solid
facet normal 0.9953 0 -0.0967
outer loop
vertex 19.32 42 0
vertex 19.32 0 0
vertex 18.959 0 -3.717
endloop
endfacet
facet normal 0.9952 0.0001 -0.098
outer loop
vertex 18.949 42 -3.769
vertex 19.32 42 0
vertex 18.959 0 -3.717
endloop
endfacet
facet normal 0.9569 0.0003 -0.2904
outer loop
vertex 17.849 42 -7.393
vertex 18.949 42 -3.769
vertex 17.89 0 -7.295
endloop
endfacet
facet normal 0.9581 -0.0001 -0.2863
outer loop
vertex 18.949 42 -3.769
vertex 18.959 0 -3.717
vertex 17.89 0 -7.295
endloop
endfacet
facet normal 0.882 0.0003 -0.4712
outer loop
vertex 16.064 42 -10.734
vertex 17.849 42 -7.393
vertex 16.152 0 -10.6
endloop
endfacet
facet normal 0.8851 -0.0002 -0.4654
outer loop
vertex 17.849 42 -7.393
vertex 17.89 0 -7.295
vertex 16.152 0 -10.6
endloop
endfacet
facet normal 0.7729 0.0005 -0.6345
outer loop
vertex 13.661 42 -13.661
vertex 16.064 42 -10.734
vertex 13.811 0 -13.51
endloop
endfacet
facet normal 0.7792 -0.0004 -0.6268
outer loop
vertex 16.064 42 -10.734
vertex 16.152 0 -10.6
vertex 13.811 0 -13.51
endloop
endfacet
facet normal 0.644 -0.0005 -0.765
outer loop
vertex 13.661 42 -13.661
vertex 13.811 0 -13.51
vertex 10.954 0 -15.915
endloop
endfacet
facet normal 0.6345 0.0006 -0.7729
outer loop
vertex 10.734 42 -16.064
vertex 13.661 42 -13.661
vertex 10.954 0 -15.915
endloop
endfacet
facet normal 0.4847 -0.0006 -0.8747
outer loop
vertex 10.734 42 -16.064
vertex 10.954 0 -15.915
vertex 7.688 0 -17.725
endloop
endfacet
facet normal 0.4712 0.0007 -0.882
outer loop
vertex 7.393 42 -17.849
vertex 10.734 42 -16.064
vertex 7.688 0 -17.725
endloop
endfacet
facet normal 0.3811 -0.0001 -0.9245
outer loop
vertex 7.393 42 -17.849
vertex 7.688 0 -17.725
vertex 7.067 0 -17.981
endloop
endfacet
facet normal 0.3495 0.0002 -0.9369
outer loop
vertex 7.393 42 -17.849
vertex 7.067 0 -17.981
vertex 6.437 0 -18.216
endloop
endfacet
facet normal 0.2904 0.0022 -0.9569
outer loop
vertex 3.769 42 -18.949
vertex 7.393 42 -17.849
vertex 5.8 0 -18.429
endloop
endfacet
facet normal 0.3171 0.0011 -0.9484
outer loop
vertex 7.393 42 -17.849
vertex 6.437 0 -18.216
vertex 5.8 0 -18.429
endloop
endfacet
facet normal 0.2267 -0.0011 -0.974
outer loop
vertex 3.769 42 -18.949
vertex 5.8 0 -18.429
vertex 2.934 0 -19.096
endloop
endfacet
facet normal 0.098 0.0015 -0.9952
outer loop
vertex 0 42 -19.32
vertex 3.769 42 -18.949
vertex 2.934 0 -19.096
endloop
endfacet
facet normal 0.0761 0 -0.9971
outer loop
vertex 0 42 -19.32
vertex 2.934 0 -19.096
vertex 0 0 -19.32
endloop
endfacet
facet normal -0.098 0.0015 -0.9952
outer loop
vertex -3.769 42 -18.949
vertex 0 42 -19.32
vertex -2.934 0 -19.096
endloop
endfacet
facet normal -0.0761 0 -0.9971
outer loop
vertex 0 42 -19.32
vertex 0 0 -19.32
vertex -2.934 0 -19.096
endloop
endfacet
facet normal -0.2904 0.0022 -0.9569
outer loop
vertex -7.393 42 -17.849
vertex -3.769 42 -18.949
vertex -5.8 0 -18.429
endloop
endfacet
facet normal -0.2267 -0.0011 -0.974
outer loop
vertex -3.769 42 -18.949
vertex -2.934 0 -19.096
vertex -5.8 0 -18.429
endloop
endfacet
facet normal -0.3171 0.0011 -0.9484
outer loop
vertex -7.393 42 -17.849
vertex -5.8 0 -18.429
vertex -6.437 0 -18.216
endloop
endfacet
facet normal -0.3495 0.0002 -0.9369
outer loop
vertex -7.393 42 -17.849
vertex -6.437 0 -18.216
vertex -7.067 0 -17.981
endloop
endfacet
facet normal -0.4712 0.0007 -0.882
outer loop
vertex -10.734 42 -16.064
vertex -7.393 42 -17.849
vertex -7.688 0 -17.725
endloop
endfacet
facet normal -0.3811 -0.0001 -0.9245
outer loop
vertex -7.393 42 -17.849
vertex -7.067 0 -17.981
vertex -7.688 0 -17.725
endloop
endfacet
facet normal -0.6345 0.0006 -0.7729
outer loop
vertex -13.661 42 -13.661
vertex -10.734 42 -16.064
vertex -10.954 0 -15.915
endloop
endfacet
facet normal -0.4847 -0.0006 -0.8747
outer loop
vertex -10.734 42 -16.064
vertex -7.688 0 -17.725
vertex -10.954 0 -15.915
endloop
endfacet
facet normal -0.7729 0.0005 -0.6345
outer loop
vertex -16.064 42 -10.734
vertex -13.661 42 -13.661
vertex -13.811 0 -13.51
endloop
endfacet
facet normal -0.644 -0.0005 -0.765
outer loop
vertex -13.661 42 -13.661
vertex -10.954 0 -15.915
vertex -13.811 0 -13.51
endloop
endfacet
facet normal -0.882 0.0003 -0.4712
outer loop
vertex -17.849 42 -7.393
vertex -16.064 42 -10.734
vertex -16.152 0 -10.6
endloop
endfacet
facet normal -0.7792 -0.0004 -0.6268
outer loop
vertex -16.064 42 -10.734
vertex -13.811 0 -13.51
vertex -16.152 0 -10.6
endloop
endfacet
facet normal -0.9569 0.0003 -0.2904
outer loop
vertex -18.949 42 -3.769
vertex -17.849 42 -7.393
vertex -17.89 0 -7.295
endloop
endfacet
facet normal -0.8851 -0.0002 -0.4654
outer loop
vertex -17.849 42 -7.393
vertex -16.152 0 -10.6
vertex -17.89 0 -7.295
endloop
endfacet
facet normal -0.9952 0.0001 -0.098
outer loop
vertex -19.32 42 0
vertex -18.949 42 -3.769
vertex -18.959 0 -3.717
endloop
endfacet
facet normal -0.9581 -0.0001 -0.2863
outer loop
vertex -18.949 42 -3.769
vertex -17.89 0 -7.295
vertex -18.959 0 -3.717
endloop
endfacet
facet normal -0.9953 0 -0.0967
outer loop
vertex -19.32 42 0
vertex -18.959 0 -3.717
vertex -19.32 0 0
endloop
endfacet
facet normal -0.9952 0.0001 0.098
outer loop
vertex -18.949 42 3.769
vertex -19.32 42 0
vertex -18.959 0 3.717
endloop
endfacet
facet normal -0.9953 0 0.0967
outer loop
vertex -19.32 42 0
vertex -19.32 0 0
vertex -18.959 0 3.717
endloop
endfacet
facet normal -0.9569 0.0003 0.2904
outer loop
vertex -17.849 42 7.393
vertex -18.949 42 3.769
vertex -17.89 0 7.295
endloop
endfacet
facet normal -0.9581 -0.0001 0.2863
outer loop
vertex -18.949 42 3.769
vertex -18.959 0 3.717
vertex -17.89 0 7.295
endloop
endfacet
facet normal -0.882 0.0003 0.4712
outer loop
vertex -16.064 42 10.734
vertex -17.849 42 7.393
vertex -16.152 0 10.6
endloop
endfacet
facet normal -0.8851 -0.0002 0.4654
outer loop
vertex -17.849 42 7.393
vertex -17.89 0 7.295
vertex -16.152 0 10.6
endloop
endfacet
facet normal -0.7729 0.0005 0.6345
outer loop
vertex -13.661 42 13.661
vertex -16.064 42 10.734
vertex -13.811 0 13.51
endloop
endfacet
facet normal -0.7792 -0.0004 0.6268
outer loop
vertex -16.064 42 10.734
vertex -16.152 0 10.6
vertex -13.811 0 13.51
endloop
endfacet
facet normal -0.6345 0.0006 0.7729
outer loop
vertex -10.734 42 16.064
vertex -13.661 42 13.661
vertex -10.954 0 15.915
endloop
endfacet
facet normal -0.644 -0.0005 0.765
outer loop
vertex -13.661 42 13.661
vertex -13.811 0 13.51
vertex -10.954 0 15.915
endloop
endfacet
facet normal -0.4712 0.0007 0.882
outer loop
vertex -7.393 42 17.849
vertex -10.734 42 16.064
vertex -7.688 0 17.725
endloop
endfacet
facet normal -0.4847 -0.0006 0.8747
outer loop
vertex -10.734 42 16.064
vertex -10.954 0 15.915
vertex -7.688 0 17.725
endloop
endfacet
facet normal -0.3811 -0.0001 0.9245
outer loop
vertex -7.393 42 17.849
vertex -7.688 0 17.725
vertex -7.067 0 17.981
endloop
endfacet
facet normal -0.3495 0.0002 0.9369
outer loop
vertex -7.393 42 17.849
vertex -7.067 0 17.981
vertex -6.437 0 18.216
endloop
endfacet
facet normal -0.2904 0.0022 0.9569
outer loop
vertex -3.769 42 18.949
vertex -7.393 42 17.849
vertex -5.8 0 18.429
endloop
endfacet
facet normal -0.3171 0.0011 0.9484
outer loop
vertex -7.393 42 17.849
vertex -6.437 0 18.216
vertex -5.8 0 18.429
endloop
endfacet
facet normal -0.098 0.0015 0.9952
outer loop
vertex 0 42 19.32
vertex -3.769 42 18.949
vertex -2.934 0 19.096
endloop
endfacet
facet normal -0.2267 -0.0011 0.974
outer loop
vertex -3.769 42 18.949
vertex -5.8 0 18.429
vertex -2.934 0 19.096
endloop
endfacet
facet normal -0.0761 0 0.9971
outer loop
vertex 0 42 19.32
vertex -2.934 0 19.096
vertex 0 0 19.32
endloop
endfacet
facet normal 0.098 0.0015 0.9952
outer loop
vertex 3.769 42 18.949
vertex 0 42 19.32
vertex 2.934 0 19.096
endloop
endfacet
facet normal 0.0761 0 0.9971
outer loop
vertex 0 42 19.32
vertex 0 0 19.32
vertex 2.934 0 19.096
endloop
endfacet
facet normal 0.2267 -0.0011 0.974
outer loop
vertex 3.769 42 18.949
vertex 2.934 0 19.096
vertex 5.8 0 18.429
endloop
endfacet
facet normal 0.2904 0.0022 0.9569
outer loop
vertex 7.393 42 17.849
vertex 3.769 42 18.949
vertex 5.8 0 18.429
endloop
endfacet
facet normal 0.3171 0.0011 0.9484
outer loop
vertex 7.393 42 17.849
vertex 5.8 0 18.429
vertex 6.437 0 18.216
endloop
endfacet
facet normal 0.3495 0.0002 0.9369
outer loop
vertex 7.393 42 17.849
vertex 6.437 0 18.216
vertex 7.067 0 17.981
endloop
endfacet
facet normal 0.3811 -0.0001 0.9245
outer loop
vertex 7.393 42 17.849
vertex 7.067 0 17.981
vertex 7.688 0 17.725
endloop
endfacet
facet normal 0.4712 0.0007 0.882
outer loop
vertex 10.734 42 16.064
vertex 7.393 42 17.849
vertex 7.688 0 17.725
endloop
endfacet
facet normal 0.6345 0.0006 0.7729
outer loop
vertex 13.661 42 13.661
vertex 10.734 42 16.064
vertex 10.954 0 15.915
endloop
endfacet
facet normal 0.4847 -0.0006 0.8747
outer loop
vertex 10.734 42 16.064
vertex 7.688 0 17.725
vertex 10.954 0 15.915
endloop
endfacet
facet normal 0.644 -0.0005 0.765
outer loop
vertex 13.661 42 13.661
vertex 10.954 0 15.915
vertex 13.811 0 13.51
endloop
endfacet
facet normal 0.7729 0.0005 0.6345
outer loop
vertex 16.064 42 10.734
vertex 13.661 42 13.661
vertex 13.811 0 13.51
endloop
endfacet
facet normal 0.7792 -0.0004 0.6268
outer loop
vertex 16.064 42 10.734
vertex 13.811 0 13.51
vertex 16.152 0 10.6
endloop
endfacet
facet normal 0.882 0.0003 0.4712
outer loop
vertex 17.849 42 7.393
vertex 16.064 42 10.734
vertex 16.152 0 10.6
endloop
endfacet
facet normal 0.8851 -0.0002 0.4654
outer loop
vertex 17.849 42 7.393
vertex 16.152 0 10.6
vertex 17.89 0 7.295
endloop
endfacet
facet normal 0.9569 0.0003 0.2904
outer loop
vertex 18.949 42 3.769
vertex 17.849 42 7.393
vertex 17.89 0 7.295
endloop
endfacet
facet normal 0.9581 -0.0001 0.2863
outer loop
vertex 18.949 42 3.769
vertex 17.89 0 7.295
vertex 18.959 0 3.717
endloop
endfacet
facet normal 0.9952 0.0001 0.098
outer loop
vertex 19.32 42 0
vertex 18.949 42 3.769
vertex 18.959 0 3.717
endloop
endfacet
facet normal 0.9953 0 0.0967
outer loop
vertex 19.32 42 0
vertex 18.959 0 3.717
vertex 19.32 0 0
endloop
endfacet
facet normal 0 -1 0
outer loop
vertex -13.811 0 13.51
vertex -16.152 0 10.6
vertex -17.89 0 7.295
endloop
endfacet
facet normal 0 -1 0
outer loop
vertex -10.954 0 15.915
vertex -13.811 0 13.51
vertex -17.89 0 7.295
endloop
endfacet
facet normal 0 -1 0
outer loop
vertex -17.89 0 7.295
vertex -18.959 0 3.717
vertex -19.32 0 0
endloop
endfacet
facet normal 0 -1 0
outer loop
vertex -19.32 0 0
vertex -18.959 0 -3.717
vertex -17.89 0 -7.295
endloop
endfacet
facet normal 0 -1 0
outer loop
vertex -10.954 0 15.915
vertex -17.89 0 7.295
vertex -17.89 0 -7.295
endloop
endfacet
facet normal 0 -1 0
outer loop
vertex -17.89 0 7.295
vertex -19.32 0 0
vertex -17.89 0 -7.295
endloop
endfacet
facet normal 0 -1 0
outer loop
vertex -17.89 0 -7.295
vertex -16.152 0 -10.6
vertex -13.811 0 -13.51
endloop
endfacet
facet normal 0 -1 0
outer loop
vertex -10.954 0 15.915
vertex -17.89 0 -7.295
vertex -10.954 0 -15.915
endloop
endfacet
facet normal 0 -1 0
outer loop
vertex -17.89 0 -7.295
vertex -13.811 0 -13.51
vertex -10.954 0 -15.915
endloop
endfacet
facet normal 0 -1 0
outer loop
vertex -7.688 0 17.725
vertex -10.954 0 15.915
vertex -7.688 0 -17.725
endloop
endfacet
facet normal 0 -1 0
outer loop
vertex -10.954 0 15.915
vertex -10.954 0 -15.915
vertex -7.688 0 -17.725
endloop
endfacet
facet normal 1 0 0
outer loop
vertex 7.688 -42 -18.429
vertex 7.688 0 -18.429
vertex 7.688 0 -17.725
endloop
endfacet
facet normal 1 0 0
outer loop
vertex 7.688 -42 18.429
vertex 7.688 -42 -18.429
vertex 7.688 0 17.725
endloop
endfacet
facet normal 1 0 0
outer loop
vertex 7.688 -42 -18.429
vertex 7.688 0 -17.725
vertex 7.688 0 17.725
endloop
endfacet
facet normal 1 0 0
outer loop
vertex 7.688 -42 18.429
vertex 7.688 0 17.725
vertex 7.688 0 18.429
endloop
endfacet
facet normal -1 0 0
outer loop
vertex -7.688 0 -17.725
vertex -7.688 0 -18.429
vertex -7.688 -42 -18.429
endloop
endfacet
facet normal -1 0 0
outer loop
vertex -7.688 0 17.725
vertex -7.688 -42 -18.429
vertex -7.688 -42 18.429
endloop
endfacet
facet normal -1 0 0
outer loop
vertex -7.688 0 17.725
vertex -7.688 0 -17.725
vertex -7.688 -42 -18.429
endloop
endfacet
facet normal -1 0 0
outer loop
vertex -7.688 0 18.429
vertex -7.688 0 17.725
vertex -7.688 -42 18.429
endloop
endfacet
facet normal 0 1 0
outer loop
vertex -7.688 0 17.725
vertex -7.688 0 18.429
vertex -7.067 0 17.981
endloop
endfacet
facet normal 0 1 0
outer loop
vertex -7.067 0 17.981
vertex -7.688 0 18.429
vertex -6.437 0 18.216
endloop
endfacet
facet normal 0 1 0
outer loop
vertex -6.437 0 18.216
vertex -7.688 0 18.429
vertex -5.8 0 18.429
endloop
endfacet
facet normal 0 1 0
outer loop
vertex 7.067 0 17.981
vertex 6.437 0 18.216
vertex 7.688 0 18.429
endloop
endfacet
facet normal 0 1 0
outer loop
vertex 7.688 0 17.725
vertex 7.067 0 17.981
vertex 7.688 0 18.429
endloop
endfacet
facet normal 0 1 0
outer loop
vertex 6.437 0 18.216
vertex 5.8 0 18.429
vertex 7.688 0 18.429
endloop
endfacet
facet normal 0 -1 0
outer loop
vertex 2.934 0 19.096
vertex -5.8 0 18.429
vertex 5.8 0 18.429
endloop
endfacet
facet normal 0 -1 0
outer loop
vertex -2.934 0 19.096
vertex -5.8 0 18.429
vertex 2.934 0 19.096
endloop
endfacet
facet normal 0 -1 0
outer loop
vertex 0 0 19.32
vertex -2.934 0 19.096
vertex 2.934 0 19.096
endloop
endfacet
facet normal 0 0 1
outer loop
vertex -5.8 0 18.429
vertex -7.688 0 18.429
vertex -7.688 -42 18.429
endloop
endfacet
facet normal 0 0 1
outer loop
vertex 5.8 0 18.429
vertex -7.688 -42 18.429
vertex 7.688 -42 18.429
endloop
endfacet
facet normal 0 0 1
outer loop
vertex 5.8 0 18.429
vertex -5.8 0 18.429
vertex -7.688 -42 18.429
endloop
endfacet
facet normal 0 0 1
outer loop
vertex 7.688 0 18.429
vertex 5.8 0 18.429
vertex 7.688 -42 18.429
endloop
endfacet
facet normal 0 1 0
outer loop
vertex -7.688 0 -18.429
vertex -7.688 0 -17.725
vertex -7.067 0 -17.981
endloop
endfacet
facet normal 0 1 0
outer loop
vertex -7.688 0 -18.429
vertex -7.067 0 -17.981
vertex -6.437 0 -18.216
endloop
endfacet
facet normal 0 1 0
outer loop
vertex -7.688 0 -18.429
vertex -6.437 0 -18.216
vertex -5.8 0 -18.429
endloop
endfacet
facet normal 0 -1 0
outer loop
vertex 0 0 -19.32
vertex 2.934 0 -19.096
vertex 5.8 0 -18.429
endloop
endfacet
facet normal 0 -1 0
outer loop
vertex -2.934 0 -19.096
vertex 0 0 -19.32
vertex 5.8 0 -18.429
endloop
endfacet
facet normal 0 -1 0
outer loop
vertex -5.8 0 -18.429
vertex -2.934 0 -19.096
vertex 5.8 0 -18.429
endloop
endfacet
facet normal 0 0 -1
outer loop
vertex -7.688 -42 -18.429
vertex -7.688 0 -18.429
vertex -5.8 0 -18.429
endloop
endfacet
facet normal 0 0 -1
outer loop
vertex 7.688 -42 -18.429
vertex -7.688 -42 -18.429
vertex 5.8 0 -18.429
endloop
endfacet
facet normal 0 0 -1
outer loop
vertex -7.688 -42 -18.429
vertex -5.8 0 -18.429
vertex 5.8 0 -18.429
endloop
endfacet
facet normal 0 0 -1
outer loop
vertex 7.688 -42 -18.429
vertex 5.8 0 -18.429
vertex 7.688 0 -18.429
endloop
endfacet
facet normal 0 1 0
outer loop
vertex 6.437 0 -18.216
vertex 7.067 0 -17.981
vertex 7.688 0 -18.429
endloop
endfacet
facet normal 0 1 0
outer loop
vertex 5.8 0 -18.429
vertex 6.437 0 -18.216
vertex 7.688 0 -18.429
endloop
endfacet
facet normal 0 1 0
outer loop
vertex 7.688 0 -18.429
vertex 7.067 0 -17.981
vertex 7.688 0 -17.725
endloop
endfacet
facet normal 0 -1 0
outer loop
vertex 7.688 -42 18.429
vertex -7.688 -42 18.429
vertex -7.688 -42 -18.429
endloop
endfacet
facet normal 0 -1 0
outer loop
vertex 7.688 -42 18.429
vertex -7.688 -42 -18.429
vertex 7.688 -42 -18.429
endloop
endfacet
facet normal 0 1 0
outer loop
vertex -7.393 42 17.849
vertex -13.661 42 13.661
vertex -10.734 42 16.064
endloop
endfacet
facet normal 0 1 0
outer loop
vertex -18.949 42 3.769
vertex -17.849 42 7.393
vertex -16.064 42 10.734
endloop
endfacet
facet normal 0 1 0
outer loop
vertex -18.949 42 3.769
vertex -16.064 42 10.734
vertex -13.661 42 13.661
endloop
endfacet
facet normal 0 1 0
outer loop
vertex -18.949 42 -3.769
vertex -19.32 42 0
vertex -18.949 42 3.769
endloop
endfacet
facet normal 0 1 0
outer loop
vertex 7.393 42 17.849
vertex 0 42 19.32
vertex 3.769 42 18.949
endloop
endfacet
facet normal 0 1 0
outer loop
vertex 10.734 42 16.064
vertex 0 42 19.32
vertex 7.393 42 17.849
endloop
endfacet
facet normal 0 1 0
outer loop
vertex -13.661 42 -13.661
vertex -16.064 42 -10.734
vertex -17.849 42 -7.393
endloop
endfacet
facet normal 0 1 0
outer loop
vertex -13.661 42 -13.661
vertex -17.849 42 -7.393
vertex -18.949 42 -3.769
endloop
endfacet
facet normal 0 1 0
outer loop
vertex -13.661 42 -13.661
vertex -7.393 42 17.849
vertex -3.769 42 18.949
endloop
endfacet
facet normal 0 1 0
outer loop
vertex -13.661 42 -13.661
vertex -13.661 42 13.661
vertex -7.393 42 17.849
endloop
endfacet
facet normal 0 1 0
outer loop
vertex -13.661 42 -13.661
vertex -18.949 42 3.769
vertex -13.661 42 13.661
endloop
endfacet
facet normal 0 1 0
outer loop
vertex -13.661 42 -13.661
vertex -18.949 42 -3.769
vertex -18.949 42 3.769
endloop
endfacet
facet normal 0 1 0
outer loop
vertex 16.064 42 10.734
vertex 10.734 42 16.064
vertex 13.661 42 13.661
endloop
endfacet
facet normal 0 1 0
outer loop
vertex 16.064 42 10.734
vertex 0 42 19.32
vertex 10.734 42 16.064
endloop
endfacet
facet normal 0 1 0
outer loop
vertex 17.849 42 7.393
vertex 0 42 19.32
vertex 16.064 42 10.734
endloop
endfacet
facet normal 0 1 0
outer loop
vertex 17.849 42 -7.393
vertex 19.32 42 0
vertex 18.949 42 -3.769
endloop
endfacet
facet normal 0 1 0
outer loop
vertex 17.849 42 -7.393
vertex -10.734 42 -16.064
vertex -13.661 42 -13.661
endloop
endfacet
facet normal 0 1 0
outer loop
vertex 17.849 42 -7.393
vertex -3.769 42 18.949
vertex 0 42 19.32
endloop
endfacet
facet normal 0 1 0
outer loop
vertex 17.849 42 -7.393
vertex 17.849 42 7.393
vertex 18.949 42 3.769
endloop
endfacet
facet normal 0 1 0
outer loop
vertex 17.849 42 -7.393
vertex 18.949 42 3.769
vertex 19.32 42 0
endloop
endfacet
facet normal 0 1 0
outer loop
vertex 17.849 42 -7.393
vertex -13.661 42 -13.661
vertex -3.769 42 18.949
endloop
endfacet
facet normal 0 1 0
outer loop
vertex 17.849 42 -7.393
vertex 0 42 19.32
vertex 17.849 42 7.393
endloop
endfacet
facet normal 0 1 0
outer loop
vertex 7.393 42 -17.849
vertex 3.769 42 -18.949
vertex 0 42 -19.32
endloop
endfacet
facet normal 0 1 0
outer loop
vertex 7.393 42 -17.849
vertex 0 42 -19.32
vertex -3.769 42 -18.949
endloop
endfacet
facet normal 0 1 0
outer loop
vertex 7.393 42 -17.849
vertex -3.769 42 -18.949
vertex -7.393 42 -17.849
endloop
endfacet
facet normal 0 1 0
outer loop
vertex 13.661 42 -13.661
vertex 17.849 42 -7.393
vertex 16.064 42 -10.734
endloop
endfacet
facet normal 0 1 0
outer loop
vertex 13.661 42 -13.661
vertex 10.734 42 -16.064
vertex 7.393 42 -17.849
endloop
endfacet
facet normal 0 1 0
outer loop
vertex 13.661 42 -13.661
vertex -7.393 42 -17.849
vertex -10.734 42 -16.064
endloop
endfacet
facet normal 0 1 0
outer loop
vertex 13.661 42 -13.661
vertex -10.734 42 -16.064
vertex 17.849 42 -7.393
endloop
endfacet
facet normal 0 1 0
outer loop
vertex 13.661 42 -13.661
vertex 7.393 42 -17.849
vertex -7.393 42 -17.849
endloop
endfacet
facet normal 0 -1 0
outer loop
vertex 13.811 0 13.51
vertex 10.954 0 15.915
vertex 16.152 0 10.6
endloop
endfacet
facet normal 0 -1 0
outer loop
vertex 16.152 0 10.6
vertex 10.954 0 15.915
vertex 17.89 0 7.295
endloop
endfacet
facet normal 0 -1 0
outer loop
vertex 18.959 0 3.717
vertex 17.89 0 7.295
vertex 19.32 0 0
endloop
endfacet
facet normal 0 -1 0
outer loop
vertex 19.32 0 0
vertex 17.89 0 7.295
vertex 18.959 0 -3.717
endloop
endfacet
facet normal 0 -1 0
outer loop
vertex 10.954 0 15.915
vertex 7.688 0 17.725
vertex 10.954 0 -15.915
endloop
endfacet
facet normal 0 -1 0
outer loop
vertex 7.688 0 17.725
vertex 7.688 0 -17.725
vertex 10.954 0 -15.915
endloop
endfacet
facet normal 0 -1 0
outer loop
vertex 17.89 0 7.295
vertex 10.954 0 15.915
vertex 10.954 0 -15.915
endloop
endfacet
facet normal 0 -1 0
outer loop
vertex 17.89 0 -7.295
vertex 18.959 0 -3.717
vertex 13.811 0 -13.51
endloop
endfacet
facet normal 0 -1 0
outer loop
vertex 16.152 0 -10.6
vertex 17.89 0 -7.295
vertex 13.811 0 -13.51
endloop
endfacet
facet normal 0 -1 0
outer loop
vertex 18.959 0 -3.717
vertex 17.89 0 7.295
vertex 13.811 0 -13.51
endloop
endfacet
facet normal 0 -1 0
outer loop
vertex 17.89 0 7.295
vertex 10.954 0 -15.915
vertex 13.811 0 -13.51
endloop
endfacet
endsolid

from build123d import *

# Parameters (mm, degrees)
SKETCH_1_R      = 19.32
EXTRUDE_1_DEPTH = 42
SKETCH_2_W      = 15.375163756
SKETCH_2_H      = 36.857684224
EXTRUDE_2_DEPTH = 42


with BuildPart() as part:
    # Эскиз1 → Бобышка-Вытянуть1 (new body)
    with BuildSketch(Plane(origin=(0, 0, 0), x_dir=(1, 0, 0), z_dir=(0, 1, 0))):
        Circle(SKETCH_1_R)
    extrude(amount=EXTRUDE_1_DEPTH)

    # Эскиз2 → Бобышка-Вытянуть2 (add)
    with BuildSketch(Plane.XZ):
        Rectangle(SKETCH_2_W, SKETCH_2_H)
    extrude(amount=EXTRUDE_2_DEPTH)


solid = part.part
